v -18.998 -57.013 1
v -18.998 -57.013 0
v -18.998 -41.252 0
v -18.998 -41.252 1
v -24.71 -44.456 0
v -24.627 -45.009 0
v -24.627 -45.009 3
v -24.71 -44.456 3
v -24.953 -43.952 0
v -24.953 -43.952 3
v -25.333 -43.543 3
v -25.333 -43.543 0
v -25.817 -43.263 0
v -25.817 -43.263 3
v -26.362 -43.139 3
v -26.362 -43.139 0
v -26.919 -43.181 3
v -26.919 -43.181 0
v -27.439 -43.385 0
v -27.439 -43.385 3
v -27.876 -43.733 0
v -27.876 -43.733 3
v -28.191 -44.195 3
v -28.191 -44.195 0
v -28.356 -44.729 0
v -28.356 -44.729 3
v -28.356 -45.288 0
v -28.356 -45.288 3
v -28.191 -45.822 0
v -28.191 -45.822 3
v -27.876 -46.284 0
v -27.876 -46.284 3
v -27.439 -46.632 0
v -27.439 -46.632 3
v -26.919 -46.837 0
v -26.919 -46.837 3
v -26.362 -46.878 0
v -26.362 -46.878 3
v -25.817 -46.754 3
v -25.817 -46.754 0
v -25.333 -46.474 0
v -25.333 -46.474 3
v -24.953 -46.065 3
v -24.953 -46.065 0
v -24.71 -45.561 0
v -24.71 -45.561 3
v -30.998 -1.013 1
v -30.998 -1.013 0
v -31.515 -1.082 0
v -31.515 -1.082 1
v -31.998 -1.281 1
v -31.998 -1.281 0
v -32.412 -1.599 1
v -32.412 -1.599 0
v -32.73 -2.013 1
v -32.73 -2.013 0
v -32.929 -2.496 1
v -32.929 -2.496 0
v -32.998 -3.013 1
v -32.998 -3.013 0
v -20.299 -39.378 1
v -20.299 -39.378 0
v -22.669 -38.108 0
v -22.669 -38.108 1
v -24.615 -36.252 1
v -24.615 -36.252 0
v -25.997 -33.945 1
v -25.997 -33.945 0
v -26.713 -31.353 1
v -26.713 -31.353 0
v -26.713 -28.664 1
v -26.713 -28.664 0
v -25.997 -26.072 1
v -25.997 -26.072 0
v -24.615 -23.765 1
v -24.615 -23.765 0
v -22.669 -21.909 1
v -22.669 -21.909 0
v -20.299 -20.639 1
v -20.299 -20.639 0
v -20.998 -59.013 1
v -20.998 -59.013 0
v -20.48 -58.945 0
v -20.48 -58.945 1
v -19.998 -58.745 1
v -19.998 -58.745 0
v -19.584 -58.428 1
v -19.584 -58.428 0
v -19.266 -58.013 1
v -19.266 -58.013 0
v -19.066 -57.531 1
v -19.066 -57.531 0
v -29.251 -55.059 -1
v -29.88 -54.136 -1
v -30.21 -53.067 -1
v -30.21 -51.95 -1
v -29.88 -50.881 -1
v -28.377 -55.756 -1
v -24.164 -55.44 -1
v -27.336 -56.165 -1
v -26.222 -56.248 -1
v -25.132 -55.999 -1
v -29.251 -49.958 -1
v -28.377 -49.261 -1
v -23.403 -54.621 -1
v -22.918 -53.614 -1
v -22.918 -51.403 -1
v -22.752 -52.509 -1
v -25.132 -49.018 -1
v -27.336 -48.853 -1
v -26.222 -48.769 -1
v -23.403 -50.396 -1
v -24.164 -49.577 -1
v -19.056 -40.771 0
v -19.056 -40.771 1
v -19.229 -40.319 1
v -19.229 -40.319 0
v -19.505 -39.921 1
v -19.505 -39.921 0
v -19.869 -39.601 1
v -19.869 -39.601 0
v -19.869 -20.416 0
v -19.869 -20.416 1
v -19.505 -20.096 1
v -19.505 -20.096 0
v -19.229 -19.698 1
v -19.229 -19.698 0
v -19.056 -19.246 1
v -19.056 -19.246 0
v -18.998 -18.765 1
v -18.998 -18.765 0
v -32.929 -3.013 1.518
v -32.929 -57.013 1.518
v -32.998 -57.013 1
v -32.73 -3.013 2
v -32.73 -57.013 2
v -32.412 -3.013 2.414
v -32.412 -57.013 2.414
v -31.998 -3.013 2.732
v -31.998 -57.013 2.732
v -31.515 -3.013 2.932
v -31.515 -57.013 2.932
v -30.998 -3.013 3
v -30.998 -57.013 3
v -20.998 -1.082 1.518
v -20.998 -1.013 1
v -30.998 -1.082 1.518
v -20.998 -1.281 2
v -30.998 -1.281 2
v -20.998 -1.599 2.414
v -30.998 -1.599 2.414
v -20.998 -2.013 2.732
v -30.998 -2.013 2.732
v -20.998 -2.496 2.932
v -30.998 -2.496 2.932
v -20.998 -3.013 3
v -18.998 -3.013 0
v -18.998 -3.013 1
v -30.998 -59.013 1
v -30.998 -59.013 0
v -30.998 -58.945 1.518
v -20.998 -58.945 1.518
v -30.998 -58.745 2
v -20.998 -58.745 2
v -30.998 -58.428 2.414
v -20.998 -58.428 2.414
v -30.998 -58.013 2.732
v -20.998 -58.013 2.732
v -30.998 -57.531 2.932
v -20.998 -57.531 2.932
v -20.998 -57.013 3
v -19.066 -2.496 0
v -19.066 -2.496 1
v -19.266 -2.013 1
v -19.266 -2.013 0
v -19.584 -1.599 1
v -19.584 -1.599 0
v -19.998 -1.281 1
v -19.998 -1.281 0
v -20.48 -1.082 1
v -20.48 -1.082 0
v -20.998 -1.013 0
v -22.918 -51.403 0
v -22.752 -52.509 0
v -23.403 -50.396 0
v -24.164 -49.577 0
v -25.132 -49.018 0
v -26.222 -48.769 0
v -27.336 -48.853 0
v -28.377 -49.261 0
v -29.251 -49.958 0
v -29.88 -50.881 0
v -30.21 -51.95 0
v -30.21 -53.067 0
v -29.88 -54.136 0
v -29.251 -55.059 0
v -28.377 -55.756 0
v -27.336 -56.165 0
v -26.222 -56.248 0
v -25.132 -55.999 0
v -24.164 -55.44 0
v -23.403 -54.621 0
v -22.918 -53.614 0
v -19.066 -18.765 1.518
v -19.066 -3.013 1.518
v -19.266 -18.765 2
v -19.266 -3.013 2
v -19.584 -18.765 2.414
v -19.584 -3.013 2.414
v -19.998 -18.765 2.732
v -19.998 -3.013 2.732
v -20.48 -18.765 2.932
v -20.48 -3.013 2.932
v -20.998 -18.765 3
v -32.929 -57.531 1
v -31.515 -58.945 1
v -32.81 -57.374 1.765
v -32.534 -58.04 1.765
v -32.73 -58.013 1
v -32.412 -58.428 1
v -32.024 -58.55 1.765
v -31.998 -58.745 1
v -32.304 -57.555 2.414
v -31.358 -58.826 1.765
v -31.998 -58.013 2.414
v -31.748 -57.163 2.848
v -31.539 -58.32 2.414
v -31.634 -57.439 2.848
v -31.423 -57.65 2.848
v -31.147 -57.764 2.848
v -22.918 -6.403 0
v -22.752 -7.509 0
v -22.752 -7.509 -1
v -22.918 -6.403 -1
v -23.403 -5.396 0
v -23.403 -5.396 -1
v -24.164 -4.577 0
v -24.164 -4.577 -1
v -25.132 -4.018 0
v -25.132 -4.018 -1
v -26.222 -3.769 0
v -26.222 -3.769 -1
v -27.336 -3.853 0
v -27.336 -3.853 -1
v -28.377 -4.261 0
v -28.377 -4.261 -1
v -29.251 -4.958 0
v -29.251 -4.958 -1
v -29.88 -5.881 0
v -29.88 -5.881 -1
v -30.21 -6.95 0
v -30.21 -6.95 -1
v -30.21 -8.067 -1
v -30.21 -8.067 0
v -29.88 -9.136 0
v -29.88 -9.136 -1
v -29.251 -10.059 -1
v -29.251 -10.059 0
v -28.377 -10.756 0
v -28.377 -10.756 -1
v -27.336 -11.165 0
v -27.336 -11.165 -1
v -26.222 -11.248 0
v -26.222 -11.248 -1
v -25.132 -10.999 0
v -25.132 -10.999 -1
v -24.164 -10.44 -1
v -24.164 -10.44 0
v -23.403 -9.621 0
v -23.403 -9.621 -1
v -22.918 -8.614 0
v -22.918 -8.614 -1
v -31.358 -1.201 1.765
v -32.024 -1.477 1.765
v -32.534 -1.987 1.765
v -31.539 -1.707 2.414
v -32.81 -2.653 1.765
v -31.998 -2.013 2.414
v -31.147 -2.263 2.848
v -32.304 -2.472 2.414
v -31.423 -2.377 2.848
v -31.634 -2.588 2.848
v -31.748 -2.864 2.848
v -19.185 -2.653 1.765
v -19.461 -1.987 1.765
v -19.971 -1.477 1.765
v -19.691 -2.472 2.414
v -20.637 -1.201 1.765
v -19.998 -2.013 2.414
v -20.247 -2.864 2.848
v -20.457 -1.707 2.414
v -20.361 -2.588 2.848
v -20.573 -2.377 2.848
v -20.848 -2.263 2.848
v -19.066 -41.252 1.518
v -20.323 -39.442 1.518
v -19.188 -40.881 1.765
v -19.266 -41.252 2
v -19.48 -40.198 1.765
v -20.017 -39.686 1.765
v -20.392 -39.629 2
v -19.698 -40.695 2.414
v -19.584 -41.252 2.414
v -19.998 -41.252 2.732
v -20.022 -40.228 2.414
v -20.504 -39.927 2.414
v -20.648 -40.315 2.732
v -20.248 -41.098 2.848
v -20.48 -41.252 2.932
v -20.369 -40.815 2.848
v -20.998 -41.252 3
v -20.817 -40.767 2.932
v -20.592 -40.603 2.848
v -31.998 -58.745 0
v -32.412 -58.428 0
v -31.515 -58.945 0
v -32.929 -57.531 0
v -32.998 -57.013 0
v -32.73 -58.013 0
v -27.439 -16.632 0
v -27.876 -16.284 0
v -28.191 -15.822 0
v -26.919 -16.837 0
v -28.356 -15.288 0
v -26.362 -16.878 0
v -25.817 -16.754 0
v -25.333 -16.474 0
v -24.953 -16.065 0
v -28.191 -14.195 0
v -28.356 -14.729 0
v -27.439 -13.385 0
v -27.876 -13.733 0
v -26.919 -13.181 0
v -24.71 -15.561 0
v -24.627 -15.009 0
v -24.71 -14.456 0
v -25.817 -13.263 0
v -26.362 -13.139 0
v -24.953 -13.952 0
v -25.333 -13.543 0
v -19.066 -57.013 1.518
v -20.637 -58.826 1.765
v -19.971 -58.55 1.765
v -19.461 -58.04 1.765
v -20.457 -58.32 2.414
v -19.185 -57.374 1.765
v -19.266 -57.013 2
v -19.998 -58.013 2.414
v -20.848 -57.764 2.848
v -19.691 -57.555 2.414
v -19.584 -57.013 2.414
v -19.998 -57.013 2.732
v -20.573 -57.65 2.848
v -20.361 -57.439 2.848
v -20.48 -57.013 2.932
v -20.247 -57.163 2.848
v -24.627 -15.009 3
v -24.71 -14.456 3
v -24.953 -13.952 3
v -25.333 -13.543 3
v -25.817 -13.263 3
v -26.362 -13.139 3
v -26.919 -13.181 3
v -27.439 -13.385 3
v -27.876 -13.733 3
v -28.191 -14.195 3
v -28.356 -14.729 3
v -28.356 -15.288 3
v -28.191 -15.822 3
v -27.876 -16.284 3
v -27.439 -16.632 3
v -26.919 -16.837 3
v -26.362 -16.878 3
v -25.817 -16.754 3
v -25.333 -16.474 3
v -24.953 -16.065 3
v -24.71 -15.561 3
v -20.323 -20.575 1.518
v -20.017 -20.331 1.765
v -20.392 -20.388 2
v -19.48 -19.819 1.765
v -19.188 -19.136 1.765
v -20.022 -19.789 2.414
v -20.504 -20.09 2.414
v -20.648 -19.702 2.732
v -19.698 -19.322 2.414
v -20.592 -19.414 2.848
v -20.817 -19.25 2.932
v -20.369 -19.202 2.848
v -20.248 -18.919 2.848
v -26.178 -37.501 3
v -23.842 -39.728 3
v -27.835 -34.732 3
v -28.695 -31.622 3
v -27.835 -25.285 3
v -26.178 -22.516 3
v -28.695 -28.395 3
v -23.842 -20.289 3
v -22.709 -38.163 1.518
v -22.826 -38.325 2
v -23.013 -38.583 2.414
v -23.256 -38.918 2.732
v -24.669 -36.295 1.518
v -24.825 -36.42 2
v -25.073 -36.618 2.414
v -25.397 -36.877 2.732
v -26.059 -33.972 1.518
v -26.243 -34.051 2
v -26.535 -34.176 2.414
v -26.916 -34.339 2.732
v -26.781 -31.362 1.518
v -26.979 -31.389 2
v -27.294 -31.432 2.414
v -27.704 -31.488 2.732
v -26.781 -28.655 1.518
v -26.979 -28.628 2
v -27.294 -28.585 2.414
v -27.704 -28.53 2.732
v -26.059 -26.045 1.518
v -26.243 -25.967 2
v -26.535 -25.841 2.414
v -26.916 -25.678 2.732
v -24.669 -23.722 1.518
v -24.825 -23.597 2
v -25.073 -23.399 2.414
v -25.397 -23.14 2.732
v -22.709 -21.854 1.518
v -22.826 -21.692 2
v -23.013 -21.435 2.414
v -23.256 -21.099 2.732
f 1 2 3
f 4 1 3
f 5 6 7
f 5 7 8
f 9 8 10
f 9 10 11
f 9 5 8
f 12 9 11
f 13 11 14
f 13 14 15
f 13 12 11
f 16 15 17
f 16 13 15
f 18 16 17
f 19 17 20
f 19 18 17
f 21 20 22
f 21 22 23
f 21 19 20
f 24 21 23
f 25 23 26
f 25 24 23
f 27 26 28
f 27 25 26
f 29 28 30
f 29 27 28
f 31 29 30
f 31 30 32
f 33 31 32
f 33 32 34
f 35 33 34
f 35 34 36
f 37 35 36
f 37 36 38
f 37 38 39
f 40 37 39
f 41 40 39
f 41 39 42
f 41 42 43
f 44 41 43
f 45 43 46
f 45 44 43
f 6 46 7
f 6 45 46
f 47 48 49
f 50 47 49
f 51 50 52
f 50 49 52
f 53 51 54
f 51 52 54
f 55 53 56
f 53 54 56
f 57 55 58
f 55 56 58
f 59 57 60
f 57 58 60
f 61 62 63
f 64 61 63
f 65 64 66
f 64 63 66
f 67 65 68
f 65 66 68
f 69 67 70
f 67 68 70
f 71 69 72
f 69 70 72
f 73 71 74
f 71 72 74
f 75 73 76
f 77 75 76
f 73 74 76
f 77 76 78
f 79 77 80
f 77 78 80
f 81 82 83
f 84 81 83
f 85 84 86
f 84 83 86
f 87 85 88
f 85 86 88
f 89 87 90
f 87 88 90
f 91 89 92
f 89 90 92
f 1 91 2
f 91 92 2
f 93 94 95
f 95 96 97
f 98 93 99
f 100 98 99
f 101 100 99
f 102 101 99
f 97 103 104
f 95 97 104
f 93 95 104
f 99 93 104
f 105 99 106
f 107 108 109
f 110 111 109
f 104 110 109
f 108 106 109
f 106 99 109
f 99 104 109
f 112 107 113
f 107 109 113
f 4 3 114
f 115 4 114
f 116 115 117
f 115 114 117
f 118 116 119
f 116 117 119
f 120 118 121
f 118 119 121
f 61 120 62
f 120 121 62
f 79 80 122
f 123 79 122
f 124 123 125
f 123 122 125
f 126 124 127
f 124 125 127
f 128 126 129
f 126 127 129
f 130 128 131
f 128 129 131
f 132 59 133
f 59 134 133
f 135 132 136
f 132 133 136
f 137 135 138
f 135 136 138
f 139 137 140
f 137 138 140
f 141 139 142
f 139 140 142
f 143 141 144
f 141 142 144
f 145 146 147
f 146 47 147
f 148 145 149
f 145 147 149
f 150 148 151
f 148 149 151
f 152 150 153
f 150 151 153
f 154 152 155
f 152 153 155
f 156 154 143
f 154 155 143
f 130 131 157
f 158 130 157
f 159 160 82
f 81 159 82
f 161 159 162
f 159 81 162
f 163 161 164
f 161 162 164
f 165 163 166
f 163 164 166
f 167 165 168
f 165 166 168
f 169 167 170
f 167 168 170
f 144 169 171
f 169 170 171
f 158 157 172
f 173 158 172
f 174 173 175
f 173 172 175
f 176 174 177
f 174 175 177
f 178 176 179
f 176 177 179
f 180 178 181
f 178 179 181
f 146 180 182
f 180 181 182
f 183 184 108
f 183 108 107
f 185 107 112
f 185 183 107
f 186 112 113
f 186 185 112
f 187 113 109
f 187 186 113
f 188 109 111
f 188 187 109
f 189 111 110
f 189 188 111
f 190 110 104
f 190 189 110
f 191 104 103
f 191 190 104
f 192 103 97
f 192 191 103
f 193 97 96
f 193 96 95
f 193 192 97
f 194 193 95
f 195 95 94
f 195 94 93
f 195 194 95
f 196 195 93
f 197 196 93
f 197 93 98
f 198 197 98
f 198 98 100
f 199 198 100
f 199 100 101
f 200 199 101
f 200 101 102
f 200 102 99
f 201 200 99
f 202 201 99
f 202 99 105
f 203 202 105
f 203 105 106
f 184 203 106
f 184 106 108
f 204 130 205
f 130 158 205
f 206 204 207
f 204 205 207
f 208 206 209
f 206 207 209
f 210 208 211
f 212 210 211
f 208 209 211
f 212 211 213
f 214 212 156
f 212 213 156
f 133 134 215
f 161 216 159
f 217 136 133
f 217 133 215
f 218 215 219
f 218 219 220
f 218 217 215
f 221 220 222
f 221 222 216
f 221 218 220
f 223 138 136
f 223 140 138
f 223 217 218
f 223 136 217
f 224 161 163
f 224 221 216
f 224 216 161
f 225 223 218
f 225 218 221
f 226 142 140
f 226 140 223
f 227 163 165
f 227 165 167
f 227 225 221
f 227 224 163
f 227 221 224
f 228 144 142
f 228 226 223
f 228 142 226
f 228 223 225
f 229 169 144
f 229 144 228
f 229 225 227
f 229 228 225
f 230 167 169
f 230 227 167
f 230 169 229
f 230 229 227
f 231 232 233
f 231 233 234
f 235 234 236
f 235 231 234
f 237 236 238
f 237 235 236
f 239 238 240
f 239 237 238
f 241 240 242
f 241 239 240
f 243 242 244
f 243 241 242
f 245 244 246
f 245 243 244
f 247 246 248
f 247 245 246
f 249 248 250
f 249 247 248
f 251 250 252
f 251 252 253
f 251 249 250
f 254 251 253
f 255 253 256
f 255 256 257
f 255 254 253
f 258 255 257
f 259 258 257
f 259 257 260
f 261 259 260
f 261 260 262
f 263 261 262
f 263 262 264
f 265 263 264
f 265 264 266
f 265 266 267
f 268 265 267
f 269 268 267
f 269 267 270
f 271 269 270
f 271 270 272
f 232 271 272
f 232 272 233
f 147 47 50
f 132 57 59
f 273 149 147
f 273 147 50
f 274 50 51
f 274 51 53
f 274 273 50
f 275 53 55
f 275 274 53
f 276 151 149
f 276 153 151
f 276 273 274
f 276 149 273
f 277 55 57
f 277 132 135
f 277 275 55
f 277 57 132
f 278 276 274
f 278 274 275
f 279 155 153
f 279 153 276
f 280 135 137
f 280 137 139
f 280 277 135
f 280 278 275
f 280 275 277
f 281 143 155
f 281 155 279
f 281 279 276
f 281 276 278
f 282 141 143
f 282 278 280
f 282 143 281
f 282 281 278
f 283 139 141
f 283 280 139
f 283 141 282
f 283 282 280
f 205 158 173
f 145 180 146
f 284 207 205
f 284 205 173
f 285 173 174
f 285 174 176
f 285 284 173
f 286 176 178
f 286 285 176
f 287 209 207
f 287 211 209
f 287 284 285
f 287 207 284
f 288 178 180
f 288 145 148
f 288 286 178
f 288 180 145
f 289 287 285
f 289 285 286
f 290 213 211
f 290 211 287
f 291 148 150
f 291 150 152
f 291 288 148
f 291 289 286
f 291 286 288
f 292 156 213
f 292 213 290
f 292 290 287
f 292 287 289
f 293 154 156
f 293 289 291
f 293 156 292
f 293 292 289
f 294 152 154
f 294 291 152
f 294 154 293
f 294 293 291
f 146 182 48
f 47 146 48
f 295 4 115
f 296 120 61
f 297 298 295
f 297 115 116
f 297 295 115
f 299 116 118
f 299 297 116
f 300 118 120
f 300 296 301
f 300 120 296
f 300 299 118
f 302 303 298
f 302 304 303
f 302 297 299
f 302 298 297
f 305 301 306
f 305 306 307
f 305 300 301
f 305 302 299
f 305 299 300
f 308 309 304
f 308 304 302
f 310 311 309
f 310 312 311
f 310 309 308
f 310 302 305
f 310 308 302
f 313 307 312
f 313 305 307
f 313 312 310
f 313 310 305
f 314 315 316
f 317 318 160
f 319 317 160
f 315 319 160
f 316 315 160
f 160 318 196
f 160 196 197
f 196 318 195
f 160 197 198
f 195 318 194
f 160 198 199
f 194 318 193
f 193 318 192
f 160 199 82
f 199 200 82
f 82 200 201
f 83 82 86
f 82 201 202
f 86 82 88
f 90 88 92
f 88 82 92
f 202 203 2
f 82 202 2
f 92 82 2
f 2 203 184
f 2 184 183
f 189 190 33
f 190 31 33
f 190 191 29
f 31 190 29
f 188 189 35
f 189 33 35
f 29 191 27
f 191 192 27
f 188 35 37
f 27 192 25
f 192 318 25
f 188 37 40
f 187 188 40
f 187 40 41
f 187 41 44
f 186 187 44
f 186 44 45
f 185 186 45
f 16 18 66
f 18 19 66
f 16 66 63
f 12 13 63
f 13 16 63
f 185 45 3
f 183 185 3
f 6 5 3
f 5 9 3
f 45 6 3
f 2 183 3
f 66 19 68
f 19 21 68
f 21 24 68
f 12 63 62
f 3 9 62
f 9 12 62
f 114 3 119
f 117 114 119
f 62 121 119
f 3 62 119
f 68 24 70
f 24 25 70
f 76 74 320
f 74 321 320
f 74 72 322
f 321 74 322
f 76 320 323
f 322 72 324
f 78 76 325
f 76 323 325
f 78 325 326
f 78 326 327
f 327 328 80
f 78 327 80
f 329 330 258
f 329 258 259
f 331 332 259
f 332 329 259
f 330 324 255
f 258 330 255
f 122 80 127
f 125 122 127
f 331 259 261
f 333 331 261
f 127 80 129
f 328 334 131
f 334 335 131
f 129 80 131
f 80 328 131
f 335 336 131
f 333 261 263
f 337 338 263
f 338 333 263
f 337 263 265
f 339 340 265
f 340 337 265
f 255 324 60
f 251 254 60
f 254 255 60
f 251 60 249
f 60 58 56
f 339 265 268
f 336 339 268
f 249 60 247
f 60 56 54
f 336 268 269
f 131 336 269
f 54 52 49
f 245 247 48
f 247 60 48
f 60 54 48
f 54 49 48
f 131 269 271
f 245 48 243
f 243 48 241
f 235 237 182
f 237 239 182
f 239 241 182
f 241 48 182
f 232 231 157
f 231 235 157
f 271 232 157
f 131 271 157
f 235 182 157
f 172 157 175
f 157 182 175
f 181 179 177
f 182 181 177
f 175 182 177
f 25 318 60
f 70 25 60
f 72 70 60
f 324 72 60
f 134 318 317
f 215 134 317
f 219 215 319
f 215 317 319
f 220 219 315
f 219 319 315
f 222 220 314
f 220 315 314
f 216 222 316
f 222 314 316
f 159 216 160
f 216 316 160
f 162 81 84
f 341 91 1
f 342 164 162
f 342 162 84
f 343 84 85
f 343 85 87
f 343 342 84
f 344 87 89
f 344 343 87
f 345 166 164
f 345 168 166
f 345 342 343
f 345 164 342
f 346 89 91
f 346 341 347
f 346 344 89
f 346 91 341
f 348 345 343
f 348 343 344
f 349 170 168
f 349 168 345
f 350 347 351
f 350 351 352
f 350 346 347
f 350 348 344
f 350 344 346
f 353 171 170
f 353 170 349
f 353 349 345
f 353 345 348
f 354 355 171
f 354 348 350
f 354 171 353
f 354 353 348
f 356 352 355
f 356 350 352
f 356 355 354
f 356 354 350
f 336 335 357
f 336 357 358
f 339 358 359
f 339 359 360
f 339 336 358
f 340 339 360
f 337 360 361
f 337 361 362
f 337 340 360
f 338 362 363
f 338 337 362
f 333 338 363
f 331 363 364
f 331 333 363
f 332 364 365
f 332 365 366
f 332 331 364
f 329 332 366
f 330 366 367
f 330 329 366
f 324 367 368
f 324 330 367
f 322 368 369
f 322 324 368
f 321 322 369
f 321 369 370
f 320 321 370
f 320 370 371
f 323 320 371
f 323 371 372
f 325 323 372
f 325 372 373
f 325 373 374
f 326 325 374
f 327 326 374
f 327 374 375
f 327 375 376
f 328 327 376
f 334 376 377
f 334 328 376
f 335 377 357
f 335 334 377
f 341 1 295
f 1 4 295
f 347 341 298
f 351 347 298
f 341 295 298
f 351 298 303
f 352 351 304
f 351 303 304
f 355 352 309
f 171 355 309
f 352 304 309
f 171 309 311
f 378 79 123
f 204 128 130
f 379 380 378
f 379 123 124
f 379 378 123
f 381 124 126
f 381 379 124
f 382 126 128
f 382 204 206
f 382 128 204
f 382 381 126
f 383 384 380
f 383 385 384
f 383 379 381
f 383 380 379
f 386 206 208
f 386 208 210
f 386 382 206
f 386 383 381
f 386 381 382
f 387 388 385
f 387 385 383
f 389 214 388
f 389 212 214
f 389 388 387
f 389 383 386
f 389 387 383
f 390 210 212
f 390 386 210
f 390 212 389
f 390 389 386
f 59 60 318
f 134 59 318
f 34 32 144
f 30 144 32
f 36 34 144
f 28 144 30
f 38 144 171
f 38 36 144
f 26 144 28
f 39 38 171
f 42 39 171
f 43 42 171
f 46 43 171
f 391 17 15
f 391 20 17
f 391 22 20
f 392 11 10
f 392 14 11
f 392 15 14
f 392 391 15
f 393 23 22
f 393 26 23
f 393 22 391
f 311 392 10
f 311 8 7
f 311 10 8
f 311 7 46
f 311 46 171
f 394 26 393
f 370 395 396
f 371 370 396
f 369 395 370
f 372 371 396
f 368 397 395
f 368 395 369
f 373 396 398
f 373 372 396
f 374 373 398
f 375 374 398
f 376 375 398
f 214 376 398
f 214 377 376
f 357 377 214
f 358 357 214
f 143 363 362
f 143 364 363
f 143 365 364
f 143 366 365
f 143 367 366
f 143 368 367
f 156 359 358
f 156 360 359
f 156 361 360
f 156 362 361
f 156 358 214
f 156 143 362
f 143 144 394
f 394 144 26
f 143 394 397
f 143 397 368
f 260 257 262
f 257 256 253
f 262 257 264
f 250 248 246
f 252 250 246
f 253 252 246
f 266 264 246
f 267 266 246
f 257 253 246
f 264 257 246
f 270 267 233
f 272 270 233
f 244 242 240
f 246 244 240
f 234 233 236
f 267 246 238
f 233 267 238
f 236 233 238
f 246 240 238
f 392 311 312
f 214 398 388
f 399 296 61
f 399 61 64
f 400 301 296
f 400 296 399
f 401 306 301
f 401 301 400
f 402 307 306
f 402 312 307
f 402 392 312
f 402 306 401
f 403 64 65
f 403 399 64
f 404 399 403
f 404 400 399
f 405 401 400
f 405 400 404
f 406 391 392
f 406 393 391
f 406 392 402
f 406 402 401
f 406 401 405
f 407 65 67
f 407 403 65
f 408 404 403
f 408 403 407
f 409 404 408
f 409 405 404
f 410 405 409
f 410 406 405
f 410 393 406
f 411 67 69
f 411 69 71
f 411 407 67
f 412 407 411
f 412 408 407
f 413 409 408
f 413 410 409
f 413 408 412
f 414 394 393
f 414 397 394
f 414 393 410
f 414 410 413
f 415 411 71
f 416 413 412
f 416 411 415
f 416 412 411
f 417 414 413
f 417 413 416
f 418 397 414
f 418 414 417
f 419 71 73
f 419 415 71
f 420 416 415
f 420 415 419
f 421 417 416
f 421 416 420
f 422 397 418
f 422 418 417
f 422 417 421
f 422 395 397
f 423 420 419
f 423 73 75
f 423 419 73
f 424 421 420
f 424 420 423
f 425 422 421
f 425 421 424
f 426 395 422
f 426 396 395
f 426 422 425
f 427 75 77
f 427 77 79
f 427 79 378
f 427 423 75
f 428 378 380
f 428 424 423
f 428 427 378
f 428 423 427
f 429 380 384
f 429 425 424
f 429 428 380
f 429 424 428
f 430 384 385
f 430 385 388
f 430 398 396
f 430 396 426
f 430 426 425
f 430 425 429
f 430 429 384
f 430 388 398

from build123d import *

# Parameters (mm, degrees)
SKETCH1_R           = 1.875
BOSS_EXTRUDE1_DEPTH = 3
FILLET1_R           = 2
SKETCH2_R           = 3.75
BOSS_EXTRUDE2_DEPTH = 4


with BuildPart() as part:
    # Sketch1 → Boss-Extrude1 (new body)
    with BuildSketch(Plane.XY):
        with BuildLine():
            Line((-20.997727651, -1.013441276), (-30.997581376, -1.013441276))
            ThreePointArc((-30.997581376, -1.013441276), (-32.411794939, -1.599227714), (-32.997581376, -3.013441276))
            Line((-32.997581376, -3.013441276), (-32.997581376, -57.013441276))
            ThreePointArc((-32.997581376, -57.013441276), (-32.411794939, -58.427654839), (-30.997581376, -59.013441276))
            Line((-30.997581376, -59.013441276), (-20.997727651, -59.013441276))
            ThreePointArc((-20.997727651, -59.013441276), (-19.583514088, -58.427654839), (-18.997727651, -57.013441276))
            Line((-18.997727651, -57.013441276), (-18.997727651, -41.251974862))
            ThreePointArc((-18.997727651, -41.251974862), (-19.354888824, -40.111325665), (-20.298808241, -39.378072073))
            ThreePointArc((-20.298808241, -39.378072073), (-26.804211193, -30.008558133), (-20.298808241, -20.639044193))
            ThreePointArc((-20.298808241, -20.639044193), (-19.354888824, -19.905790602), (-18.997727651, -18.765141405))
            Line((-18.997727651, -18.765141405), (-18.997727651, -3.013441276))
            ThreePointArc((-18.997727651, -3.013441276), (-19.583514088, -1.599227714), (-20.997727651, -1.013441276))
        make_face()
        with Locations((-26.501848256, -15.008558747)):
            Circle(SKETCH1_R, mode=Mode.SUBTRACT)
        with Locations((-26.501848256, -45.008558747)):
            Circle(SKETCH1_R, mode=Mode.SUBTRACT)
    extrude(amount=BOSS_EXTRUDE1_DEPTH)

    # Fillet1
    fillet1_edges = [part.edges().sort_by_distance(p)[0] for p in [
        (-19.354888824, -40.111325665, 3),
        (-26.804211193, -30.008558133, 3),
        (-19.354888824, -19.905790602, 3),
        (-18.997727651, -10.889291341, 3),
        (-19.583514088, -1.599227714, 3),
        (-25.997654514, -1.013441276, 3),
        (-32.411794939, -1.599227714, 3),
        (-32.997581376, -30.013441276, 3),
        (-32.411794939, -58.427654839, 3),
        (-25.997654514, -59.013441276, 3),
        (-19.583514088, -58.427654839, 3),
        (-18.997727651, -49.132708069, 3),
    ]]
    fillet(fillet1_edges, radius=FILLET1_R)

    # Sketch2 → Boss-Extrude2 (add)
    with BuildSketch(Plane.XY.offset(3)):
        with Locations((-26.501848256, -7.508558747)):
            Circle(SKETCH2_R)
        with Locations((-26.501848256, -52.508558747)):
            Circle(SKETCH2_R)
    extrude(amount=-BOSS_EXTRUDE2_DEPTH)


solid = part.part
